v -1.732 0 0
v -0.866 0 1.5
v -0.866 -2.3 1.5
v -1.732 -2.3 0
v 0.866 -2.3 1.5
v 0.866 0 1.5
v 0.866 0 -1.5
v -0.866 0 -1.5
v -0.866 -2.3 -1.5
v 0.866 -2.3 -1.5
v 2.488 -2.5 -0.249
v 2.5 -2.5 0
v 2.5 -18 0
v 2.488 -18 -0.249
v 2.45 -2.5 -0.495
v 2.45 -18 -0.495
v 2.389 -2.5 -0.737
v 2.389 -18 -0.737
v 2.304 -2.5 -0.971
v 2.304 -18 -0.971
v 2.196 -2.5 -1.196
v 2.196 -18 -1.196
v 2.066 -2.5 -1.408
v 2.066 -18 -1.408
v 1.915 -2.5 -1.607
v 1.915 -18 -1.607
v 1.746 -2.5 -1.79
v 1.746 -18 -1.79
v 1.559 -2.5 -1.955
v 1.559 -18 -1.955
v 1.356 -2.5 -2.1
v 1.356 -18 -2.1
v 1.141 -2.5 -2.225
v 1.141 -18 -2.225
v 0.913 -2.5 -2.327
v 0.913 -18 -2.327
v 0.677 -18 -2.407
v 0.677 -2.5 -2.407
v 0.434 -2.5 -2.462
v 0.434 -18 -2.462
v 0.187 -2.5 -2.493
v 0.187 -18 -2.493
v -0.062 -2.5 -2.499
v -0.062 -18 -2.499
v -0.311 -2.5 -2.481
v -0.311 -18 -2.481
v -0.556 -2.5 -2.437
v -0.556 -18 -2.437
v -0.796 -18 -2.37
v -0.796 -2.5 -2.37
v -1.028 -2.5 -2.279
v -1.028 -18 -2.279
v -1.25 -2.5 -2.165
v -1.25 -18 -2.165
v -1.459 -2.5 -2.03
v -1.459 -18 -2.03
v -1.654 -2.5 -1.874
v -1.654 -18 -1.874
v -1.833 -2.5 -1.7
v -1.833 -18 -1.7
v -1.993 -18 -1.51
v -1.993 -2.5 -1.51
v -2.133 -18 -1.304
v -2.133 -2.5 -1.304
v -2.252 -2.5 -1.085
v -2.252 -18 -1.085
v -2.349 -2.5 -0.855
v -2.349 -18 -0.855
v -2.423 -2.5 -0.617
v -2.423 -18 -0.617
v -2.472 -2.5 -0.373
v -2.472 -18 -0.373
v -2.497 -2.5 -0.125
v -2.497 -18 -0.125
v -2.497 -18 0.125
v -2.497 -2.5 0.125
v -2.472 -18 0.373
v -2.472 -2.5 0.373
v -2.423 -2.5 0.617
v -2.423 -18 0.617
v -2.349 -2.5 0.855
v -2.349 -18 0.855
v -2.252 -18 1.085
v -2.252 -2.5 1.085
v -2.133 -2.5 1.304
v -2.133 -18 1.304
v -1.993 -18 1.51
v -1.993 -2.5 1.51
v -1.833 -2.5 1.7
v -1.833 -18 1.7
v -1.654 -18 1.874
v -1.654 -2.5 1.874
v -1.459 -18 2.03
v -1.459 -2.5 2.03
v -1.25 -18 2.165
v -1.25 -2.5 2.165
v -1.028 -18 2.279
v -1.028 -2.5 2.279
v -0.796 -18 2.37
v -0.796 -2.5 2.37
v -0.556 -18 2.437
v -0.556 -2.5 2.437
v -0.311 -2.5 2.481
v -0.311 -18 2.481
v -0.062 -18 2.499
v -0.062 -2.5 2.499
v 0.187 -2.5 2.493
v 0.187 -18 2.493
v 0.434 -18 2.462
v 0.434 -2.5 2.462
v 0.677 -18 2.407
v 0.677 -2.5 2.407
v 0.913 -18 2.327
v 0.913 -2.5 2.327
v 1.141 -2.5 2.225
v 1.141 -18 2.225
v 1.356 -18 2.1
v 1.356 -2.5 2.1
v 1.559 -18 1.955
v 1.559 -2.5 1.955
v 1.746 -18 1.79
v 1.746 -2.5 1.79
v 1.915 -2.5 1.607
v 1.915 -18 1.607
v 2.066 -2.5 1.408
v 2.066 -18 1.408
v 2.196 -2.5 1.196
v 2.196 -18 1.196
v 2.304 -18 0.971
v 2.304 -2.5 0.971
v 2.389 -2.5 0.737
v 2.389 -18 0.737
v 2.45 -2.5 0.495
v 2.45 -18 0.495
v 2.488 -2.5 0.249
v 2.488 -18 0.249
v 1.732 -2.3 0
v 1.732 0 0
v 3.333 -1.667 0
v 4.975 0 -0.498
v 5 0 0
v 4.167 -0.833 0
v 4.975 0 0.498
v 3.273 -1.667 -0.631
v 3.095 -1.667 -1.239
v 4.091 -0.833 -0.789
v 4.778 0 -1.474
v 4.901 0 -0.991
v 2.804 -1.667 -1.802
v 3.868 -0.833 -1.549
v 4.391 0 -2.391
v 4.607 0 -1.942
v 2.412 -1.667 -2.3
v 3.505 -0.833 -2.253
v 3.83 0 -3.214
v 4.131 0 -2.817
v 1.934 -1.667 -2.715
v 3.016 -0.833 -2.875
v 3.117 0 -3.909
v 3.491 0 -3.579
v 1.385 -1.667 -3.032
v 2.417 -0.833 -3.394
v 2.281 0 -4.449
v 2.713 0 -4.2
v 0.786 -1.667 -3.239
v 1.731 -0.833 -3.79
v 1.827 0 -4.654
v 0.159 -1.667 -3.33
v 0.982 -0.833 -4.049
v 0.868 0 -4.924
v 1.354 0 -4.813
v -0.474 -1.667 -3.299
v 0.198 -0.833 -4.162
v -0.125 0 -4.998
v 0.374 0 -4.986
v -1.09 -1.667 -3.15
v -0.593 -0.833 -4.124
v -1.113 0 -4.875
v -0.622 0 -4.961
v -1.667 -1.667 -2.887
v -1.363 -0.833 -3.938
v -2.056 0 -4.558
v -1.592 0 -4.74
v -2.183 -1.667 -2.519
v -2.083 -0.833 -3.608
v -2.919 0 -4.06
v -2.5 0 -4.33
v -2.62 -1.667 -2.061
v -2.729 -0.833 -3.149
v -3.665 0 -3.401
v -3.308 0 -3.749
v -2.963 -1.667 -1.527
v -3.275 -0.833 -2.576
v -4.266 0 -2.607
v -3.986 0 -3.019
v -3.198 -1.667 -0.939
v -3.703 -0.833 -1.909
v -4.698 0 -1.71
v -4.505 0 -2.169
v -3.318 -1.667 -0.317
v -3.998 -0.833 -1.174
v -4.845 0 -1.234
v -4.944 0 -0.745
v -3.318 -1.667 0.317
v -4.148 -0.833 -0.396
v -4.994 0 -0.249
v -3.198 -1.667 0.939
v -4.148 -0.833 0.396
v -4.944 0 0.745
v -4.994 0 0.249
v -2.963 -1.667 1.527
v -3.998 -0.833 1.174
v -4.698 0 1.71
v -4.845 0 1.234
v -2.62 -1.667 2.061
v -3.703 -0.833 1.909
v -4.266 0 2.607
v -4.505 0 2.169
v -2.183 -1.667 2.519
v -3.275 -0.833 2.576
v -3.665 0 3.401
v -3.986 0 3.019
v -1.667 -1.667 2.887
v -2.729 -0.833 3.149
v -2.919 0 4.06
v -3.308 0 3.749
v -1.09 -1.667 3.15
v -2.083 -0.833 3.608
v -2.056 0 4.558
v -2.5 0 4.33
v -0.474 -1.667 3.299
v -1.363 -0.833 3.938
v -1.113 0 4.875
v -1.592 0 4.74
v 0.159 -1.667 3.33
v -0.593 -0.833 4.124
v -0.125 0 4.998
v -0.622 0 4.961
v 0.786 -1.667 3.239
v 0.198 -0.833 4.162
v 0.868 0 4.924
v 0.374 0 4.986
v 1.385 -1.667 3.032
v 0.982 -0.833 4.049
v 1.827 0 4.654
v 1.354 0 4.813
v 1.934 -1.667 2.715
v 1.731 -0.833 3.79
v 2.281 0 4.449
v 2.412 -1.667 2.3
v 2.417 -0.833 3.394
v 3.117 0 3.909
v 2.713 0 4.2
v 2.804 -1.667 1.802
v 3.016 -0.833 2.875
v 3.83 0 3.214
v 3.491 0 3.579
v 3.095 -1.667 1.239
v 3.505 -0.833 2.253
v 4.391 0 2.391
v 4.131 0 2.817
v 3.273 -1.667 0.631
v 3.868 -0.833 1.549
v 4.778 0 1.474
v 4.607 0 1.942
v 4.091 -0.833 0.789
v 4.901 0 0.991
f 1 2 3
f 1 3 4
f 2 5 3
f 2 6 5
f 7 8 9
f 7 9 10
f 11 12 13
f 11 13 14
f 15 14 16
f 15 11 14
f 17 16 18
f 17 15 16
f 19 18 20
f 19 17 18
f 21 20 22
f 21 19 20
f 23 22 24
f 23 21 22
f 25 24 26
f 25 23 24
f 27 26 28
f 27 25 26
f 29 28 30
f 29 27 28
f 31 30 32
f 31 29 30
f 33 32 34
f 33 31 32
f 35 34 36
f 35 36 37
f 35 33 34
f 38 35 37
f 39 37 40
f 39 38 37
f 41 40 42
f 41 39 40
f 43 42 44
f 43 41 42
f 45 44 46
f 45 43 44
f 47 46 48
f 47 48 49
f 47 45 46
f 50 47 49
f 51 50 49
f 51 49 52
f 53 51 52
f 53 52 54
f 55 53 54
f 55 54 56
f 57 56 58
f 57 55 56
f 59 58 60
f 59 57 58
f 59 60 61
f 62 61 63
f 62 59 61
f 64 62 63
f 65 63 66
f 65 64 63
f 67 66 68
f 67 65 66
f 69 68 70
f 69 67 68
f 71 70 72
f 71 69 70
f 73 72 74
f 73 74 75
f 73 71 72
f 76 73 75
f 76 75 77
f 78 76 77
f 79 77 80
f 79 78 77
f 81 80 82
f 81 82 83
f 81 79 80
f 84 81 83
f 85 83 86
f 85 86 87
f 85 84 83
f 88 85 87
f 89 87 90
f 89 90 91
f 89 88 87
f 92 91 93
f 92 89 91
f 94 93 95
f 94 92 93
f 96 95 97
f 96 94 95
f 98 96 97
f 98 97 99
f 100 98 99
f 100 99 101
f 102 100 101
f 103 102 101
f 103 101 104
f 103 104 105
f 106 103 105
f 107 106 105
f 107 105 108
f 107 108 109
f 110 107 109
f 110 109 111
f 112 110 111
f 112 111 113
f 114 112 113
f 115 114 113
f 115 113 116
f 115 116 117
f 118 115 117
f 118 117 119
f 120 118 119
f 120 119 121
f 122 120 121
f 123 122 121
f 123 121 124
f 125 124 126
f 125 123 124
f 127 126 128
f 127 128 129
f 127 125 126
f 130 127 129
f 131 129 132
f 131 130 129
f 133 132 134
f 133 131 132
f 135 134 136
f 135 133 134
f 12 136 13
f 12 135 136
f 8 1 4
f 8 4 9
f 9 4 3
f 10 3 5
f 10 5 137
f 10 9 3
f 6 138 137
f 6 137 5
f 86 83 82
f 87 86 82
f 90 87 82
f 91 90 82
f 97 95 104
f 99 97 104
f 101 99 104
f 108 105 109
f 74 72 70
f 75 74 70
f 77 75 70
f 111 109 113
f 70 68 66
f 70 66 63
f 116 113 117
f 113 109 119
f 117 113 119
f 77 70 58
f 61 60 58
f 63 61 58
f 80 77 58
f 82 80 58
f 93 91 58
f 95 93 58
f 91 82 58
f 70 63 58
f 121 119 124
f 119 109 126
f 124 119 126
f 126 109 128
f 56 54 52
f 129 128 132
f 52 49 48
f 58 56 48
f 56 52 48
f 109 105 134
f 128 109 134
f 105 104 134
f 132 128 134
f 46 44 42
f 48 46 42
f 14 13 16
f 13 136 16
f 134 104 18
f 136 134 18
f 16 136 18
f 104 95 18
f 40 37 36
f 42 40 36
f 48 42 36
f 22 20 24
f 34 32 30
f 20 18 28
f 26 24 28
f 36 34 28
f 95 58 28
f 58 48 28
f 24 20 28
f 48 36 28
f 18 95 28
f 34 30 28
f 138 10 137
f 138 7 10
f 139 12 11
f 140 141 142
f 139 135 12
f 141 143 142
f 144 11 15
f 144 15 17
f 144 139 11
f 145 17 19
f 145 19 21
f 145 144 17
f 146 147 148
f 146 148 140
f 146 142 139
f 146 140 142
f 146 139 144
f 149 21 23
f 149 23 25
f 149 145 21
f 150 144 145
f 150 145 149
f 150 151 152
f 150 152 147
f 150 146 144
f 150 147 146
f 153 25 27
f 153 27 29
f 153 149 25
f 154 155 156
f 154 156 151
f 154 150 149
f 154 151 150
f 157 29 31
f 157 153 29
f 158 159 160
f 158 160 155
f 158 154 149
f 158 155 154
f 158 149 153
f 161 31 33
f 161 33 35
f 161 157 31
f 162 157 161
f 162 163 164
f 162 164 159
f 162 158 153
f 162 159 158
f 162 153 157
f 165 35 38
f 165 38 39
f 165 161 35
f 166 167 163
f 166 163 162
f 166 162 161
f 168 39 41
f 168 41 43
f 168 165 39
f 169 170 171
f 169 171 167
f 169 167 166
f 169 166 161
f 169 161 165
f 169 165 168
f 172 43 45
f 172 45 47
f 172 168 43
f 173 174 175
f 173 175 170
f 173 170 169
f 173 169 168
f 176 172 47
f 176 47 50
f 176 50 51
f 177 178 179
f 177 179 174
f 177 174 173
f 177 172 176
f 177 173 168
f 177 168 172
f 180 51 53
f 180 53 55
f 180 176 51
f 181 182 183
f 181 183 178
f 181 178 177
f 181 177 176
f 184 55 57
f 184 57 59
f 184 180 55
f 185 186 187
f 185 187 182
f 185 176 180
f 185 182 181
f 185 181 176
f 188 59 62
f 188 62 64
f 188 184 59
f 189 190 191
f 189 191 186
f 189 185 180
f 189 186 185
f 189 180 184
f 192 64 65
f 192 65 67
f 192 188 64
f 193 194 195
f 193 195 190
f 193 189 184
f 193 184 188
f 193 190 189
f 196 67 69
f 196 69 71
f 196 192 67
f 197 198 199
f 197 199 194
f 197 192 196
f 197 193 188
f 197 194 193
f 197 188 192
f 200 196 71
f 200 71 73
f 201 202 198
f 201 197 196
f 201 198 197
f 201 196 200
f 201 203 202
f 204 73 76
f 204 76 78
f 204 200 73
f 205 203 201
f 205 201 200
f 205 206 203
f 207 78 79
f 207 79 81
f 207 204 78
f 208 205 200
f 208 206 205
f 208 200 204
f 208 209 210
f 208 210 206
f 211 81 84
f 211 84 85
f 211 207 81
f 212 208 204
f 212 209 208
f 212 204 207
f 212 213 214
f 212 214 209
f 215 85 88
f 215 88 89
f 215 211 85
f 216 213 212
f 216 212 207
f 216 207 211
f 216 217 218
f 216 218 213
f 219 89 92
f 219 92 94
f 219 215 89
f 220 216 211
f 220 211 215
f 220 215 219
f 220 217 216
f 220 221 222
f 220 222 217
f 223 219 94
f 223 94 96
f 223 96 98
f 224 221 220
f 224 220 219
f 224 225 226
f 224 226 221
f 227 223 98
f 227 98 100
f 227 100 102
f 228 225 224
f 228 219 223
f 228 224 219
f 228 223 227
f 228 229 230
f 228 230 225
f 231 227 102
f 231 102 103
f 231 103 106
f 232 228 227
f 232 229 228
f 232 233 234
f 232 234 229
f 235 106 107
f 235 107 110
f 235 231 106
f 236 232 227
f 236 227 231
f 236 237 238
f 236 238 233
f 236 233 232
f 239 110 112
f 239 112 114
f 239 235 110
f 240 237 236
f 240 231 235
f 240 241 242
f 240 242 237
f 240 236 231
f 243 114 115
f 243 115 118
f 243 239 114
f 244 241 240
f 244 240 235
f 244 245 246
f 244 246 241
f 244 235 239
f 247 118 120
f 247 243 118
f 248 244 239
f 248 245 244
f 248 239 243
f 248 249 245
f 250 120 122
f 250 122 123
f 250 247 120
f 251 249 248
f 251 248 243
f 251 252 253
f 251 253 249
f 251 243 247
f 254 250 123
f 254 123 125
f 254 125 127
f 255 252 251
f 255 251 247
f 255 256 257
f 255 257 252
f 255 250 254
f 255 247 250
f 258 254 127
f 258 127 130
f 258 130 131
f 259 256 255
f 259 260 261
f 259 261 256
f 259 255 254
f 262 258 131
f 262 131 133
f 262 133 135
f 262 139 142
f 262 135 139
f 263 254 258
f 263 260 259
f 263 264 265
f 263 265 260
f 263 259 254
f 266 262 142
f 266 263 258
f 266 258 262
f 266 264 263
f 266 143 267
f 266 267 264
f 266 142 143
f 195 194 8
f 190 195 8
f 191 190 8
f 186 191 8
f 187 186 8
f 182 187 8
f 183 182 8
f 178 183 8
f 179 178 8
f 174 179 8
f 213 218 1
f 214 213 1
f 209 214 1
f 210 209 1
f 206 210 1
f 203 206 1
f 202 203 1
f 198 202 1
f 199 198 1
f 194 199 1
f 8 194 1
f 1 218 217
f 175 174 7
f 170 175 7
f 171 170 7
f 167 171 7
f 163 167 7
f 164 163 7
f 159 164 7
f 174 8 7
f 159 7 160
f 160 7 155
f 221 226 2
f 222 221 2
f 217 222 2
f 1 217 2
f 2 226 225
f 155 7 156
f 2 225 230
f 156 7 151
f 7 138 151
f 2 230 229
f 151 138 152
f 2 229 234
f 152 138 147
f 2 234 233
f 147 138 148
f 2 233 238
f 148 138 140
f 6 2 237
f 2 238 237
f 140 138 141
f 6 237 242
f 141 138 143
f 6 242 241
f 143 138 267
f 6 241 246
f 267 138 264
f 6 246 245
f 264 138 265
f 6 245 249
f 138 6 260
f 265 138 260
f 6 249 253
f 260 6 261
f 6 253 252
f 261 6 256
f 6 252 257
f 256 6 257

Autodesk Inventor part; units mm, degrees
ref_plane "YZ Plane" through (0, 0, 0) normal (1, 0, 0) x (0, 1, 0)
ref_plane "XZ Plane" through (0, 0, 0) normal (0, 1, 0) x (-1, 0, 0)
ref_plane "XY Plane" through (0, 0, 0) normal (0, 0, 1) x (1, 0, 0)
sketch "Head Revolution Profile" plane through (0, 0, 0) normal (0, 0, 1) x (1, 0, 0)
  line L0 (0, -5) -> (5, 0)
  line L1 (5, 0) -> (0, 0)
  line L2 (0, 0) -> (0, -5)
  dimension "d0" = 0
  dimension "d1" = 45
  dimension "d2" = 5
  dimension "d3" = 0
revolve "Head" add sketch "Head Revolution Profile" angle 360 about axis through (0, 0, 0) along (0, -1, 0)
sketch "Body Cross Section" plane through (0, 0, 0) normal (0, 1, 0) x (1, 0, 0)
  circle A0 centre (0, 0) radius 2.5
  point P0 (0, 0)
  dimension "d5" = 5
extrude "Body" add sketch "Body Cross Section" against normal blind 18
thread "Thread" size "M5x0.8" class "6g" standard "ANSI Metric M Profile" full length
sketch "Key Socket Cutout Outline" plane through (0, 0, 0) normal (0, 1, 0) x (1, 0, 0)
  line L0 (0.866, 1.5) -> (1.7321, 0)
  line L1 (1.7321, 0) -> (0.866, -1.5)
  line L2 (0.866, -1.5) -> (-0.866, -1.5)
  line L3 (-0.866, -1.5) -> (-1.7321, 0)
  line L4 (-1.7321, 0) -> (-0.866, 1.5)
  line L5 (-0.866, 1.5) -> (0.866, 1.5)
  point P0 (0, 0)
  point P1 (0, 0)
  dimension "d10" = 3
extrude "Key Socket Cutout" cut sketch "Key Socket Cutout Outline" against normal blind 2.3
properties part number "SSK-M5-18-A4" material "Stainless Steel AISI 317"
